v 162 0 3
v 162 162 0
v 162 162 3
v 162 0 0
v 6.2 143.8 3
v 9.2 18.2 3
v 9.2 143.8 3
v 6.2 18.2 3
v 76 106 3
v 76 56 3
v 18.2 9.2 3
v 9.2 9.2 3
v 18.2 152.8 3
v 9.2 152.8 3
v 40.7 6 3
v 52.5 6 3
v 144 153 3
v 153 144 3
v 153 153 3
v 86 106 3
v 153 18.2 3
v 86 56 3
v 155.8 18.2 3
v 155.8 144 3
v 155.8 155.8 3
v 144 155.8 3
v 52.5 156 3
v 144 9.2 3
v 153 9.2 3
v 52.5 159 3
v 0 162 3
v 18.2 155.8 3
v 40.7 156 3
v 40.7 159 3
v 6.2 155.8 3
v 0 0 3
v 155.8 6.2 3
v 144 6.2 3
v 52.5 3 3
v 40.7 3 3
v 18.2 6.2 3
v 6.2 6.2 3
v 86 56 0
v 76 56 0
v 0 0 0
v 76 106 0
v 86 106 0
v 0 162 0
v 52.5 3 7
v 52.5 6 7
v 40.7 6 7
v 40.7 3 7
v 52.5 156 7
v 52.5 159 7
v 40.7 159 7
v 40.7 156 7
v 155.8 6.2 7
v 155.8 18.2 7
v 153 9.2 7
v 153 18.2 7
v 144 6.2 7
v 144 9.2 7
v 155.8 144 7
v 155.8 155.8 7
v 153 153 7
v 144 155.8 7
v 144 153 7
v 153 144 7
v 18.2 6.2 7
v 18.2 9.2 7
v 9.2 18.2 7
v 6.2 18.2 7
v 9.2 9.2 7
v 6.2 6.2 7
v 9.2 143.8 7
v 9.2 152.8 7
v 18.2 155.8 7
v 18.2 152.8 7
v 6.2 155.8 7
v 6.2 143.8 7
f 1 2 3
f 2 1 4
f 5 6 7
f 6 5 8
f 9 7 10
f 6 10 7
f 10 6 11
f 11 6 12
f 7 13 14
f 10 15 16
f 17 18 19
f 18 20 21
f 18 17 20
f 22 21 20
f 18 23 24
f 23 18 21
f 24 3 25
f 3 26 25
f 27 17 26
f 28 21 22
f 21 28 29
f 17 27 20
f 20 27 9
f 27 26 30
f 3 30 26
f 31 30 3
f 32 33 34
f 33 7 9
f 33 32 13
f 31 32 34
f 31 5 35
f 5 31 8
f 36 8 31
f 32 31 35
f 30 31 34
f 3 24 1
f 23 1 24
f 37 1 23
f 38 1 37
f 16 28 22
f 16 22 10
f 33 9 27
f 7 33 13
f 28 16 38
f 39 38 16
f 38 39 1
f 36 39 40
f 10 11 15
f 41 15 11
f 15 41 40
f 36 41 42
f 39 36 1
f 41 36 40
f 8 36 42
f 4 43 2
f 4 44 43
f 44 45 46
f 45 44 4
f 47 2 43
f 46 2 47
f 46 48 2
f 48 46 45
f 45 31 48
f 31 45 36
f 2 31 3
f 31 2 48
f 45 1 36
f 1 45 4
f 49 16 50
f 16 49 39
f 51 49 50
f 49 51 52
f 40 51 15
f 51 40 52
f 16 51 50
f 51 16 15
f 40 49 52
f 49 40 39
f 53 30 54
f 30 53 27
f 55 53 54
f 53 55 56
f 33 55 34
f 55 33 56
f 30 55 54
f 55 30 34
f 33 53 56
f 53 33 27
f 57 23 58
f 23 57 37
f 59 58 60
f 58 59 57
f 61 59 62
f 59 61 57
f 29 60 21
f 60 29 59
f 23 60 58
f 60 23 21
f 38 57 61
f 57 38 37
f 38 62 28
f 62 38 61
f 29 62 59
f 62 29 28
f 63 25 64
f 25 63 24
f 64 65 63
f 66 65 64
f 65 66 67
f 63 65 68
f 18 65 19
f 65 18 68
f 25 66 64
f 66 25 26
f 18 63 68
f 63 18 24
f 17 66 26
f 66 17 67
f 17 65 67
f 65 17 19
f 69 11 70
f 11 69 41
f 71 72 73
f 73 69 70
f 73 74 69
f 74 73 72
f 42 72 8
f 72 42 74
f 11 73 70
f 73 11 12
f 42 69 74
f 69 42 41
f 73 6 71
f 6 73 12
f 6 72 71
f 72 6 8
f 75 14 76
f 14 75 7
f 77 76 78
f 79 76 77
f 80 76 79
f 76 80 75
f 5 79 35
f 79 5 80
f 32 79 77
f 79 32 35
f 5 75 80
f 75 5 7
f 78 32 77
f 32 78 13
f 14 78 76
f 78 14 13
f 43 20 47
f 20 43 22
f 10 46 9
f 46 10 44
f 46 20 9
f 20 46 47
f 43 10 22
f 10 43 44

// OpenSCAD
wall = 3;
height = 80;
thick = 3;
totalThick = 6;
boxInternalLen = 150;
platformWdh = 10;
platformLen = 50;
nfcReaderSupporterInternalWidth = 15.6;
nfcReaderLen = 122;
nfcReaderWdhHalf = 37;

hole = 136;
slotHeight = 4;

difference(){
    union(){
        cube([
            boxInternalLen + 2 * totalThick, 
            boxInternalLen + 2 * totalThick, 
            thick
        ], false);
        
        translate([
            (boxInternalLen + 2 * totalThick) / 2 - 45.5 + platformWdh / 2 + 0.2, 
            thick, 
            thick
        ])
        cube([12 - 0.2, thick, slotHeight], false);        
        translate([
            (boxInternalLen + 2 * totalThick) / 2 - 45.5 + platformWdh / 2 + 0.2, 
            boxInternalLen + totalThick,
            thick
        ])
        cube([12 - 0.2, thick, slotHeight], false);

        
        translate([
            boxInternalLen + totalThick - wall, 
            totalThick + 0.2, 
            thick
        ])
        cube([wall - 0.2, 4 * wall, slotHeight], false);
        translate([
            boxInternalLen + totalThick - 4 * wall, 
            totalThick + 0.2, 
            thick
        ])
        cube([4 * wall - 0.2, wall, slotHeight], false);
        
        
        translate([
            boxInternalLen + totalThick - wall,
            boxInternalLen + totalThick - 4 * wall, 
            thick
        ])
        cube([wall - 0.2, 4 * wall - 0.2, slotHeight], false);
        translate([
            boxInternalLen + totalThick - 4 * wall,
            boxInternalLen + totalThick - wall, 
            thick
        ])
        cube([4 * wall - 0.2, wall - 0.2, slotHeight], false);
        
        
        translate([totalThick + 0.2, totalThick + 0.2, thick])
        cube([4 * wall, wall, slotHeight], false);
        translate([totalThick + 0.2, totalThick + 0.2, thick])
        cube([wall, 4 * wall, slotHeight], false);
        
        translate([
            totalThick + 0.2, 
            totalThick + boxInternalLen - 4 * wall - 0.2, 
            thick
        ])
        cube([wall, 4 * wall, slotHeight], false);
        translate([
            totalThick + 0.2, 
            totalThick + boxInternalLen - wall - 0.2, 
            thick
        ])
        cube([4 * wall, wall, slotHeight], false); 
    }

    translate([
        (boxInternalLen + 2 * totalThick - platformWdh) / 2, 
        (boxInternalLen + 2 * totalThick - platformLen) / 2, 
        0
    ])
    cube([platformWdh, platformLen, thick], false);
}
